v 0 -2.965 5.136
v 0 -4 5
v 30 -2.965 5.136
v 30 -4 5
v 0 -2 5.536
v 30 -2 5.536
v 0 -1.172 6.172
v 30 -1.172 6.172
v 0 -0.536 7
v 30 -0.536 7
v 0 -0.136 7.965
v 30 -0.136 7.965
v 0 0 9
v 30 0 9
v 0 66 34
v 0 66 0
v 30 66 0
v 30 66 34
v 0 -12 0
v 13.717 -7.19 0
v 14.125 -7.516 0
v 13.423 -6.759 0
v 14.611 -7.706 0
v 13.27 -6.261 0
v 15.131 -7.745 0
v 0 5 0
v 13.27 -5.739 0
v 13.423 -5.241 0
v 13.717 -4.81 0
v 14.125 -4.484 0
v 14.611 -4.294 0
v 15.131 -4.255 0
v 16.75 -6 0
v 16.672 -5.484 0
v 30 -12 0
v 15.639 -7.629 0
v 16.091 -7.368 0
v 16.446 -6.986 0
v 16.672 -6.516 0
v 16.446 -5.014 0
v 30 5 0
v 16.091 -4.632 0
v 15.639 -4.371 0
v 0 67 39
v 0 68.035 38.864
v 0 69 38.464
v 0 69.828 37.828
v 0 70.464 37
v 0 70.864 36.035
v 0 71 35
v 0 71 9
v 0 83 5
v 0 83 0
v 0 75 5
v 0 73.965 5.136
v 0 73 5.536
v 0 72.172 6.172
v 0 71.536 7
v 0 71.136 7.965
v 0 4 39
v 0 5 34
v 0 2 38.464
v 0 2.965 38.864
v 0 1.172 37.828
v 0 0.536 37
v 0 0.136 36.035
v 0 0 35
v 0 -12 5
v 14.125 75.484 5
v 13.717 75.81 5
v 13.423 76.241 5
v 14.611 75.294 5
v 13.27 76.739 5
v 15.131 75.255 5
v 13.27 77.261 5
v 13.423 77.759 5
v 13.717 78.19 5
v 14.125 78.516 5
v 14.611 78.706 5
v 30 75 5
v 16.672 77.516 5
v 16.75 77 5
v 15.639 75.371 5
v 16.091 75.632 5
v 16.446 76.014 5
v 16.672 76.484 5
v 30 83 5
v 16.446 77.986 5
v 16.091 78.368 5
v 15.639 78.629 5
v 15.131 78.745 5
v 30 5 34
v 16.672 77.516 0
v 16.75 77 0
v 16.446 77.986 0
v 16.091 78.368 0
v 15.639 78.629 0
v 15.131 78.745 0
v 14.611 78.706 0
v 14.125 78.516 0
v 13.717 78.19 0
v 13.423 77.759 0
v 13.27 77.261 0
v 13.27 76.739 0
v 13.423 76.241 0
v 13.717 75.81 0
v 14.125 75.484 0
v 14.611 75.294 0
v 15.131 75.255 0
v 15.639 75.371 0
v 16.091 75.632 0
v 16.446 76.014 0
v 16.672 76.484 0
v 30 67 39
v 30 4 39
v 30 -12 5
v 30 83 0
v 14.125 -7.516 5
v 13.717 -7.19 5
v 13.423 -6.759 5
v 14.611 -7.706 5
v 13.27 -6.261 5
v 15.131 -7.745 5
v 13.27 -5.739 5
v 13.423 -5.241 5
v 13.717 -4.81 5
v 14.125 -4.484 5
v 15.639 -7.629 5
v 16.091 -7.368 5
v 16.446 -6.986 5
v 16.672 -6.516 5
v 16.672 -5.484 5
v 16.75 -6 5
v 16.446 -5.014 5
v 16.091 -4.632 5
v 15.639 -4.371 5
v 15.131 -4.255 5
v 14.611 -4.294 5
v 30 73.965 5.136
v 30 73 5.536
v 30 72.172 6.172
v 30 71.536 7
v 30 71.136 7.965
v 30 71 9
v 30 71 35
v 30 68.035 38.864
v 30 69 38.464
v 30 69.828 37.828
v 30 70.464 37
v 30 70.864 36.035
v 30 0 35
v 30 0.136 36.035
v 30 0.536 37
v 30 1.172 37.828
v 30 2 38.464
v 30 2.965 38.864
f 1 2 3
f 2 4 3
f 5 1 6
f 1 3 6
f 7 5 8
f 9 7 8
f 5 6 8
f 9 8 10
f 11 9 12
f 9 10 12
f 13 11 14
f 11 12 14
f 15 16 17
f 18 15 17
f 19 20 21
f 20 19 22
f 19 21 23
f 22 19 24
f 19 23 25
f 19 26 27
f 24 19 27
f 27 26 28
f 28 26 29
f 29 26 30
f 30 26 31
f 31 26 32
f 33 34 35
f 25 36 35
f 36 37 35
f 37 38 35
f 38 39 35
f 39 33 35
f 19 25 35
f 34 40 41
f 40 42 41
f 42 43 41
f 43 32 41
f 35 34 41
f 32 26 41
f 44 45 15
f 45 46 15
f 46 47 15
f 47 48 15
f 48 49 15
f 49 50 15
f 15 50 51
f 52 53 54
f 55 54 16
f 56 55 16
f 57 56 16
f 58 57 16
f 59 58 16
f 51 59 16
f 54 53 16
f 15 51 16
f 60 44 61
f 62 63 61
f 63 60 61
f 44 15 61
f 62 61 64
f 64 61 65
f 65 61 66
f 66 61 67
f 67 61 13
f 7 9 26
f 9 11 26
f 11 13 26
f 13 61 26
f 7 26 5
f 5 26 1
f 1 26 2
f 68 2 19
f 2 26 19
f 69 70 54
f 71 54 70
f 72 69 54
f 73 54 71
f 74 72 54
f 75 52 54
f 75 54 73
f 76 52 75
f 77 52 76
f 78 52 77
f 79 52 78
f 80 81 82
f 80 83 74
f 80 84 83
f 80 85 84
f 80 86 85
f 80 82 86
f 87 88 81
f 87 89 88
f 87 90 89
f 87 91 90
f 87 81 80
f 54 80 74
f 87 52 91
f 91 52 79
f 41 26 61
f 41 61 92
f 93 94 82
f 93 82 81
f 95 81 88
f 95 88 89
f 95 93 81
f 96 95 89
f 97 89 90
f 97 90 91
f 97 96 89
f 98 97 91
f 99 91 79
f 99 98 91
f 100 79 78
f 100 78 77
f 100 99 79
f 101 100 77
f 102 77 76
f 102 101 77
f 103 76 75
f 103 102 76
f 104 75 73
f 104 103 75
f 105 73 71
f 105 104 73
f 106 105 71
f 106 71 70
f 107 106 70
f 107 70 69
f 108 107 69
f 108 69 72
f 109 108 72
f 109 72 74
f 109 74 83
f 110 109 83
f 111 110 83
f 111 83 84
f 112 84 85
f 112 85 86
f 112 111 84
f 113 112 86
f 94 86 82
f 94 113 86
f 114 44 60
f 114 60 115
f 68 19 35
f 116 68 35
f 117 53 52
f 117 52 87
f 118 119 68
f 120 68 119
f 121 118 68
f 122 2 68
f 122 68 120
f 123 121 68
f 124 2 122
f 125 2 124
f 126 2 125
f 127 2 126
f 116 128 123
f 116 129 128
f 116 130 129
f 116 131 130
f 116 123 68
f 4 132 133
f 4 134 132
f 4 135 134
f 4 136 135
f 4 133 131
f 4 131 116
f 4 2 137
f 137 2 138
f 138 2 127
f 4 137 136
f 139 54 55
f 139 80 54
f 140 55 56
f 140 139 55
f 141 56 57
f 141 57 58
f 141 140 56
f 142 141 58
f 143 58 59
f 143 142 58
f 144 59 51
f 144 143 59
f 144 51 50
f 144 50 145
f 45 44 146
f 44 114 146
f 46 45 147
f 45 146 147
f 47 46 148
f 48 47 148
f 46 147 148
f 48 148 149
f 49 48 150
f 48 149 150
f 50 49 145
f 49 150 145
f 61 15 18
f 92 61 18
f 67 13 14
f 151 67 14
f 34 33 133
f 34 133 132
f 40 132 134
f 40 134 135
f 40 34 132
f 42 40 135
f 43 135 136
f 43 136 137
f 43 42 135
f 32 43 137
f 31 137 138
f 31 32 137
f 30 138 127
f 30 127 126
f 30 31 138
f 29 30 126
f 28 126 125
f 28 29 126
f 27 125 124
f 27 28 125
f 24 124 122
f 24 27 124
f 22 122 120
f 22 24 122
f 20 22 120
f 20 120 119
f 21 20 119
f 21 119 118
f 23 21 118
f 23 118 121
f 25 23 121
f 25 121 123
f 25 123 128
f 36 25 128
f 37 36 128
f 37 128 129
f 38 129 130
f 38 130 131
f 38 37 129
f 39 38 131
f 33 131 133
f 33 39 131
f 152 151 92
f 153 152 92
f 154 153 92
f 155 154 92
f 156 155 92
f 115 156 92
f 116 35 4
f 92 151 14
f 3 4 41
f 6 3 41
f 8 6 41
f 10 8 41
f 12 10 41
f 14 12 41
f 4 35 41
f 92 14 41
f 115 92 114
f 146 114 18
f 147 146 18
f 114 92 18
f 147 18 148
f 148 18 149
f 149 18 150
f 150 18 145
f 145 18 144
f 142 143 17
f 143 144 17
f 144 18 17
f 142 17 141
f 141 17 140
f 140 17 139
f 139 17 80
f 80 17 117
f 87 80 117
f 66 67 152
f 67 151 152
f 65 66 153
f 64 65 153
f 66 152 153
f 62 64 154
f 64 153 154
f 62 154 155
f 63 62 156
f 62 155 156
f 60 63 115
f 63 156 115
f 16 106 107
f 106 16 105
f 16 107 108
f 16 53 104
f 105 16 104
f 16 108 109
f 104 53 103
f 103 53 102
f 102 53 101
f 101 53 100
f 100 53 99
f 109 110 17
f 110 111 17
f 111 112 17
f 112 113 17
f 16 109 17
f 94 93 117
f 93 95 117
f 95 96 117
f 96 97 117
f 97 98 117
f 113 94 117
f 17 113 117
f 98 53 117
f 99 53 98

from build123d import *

# Parameters (mm, degrees)
F0_W     = 30
F0_H     = 5
F1_DEPTH = 34
F0_H_2   = 12
F0_R     = 1.75
F2_DEPTH = 5
F3_W     = 30
F3_H     = 5
F3_H_2   = 66
F4_DEPTH = 5
F5_R     = 4


with BuildPart() as f1:
    # F0 (on Top) → F1 (new body)
    with BuildSketch(Plane.XY):
        with Locations((15, 68.5)):
            Rectangle(F0_W, F0_H)
    extrude(amount=F1_DEPTH)

    # F0 (on Top) → F2 (join)
    with BuildSketch(Plane.XY):
        with Locations((15, 77)):
            Rectangle(F0_W, F0_H_2)
        with Locations((15, 77)):
            Circle(F0_R, mode=Mode.SUBTRACT)
    extrude(amount=F2_DEPTH)



with BuildPart() as f1b:
    # F0 (on Top) → F1, piece 2 (new body)
    with BuildSketch(Plane.XY):
        with Locations((15, 2.5)):
            Rectangle(F0_W, F0_H)
    extrude(amount=F1_DEPTH)

    # F0 (on Top) → F2, piece 2 (join)
    with BuildSketch(Plane.XY):
        with Locations((15, -6)):
            Rectangle(F0_W, F0_H_2)
        with Locations((15, -6)):
            Circle(F0_R, mode=Mode.SUBTRACT)
    extrude(amount=F2_DEPTH)


with BuildPart() as f1_1:
    add(f1.part)

    add(f1b.part)  # F4 merges F1b
    # F3 (on face) → F4 (join)
    with BuildSketch(Plane.XY.offset(34)):
        with Locations((15, 68.5)):
            Rectangle(F3_W, F3_H)
        with Locations((15, 33)):
            Rectangle(F3_W, F3_H_2)
    extrude(amount=F4_DEPTH)

    # F5
    f5_edges = [f1_1.edges().sort_by_distance(p)[0] for p in [
        (15, 0, 5),
        (15, 0, 39),
        (15, 71, 39),
        (15, 71, 5),
    ]]
    fillet(f5_edges, radius=F5_R)


solid = f1_1.part
